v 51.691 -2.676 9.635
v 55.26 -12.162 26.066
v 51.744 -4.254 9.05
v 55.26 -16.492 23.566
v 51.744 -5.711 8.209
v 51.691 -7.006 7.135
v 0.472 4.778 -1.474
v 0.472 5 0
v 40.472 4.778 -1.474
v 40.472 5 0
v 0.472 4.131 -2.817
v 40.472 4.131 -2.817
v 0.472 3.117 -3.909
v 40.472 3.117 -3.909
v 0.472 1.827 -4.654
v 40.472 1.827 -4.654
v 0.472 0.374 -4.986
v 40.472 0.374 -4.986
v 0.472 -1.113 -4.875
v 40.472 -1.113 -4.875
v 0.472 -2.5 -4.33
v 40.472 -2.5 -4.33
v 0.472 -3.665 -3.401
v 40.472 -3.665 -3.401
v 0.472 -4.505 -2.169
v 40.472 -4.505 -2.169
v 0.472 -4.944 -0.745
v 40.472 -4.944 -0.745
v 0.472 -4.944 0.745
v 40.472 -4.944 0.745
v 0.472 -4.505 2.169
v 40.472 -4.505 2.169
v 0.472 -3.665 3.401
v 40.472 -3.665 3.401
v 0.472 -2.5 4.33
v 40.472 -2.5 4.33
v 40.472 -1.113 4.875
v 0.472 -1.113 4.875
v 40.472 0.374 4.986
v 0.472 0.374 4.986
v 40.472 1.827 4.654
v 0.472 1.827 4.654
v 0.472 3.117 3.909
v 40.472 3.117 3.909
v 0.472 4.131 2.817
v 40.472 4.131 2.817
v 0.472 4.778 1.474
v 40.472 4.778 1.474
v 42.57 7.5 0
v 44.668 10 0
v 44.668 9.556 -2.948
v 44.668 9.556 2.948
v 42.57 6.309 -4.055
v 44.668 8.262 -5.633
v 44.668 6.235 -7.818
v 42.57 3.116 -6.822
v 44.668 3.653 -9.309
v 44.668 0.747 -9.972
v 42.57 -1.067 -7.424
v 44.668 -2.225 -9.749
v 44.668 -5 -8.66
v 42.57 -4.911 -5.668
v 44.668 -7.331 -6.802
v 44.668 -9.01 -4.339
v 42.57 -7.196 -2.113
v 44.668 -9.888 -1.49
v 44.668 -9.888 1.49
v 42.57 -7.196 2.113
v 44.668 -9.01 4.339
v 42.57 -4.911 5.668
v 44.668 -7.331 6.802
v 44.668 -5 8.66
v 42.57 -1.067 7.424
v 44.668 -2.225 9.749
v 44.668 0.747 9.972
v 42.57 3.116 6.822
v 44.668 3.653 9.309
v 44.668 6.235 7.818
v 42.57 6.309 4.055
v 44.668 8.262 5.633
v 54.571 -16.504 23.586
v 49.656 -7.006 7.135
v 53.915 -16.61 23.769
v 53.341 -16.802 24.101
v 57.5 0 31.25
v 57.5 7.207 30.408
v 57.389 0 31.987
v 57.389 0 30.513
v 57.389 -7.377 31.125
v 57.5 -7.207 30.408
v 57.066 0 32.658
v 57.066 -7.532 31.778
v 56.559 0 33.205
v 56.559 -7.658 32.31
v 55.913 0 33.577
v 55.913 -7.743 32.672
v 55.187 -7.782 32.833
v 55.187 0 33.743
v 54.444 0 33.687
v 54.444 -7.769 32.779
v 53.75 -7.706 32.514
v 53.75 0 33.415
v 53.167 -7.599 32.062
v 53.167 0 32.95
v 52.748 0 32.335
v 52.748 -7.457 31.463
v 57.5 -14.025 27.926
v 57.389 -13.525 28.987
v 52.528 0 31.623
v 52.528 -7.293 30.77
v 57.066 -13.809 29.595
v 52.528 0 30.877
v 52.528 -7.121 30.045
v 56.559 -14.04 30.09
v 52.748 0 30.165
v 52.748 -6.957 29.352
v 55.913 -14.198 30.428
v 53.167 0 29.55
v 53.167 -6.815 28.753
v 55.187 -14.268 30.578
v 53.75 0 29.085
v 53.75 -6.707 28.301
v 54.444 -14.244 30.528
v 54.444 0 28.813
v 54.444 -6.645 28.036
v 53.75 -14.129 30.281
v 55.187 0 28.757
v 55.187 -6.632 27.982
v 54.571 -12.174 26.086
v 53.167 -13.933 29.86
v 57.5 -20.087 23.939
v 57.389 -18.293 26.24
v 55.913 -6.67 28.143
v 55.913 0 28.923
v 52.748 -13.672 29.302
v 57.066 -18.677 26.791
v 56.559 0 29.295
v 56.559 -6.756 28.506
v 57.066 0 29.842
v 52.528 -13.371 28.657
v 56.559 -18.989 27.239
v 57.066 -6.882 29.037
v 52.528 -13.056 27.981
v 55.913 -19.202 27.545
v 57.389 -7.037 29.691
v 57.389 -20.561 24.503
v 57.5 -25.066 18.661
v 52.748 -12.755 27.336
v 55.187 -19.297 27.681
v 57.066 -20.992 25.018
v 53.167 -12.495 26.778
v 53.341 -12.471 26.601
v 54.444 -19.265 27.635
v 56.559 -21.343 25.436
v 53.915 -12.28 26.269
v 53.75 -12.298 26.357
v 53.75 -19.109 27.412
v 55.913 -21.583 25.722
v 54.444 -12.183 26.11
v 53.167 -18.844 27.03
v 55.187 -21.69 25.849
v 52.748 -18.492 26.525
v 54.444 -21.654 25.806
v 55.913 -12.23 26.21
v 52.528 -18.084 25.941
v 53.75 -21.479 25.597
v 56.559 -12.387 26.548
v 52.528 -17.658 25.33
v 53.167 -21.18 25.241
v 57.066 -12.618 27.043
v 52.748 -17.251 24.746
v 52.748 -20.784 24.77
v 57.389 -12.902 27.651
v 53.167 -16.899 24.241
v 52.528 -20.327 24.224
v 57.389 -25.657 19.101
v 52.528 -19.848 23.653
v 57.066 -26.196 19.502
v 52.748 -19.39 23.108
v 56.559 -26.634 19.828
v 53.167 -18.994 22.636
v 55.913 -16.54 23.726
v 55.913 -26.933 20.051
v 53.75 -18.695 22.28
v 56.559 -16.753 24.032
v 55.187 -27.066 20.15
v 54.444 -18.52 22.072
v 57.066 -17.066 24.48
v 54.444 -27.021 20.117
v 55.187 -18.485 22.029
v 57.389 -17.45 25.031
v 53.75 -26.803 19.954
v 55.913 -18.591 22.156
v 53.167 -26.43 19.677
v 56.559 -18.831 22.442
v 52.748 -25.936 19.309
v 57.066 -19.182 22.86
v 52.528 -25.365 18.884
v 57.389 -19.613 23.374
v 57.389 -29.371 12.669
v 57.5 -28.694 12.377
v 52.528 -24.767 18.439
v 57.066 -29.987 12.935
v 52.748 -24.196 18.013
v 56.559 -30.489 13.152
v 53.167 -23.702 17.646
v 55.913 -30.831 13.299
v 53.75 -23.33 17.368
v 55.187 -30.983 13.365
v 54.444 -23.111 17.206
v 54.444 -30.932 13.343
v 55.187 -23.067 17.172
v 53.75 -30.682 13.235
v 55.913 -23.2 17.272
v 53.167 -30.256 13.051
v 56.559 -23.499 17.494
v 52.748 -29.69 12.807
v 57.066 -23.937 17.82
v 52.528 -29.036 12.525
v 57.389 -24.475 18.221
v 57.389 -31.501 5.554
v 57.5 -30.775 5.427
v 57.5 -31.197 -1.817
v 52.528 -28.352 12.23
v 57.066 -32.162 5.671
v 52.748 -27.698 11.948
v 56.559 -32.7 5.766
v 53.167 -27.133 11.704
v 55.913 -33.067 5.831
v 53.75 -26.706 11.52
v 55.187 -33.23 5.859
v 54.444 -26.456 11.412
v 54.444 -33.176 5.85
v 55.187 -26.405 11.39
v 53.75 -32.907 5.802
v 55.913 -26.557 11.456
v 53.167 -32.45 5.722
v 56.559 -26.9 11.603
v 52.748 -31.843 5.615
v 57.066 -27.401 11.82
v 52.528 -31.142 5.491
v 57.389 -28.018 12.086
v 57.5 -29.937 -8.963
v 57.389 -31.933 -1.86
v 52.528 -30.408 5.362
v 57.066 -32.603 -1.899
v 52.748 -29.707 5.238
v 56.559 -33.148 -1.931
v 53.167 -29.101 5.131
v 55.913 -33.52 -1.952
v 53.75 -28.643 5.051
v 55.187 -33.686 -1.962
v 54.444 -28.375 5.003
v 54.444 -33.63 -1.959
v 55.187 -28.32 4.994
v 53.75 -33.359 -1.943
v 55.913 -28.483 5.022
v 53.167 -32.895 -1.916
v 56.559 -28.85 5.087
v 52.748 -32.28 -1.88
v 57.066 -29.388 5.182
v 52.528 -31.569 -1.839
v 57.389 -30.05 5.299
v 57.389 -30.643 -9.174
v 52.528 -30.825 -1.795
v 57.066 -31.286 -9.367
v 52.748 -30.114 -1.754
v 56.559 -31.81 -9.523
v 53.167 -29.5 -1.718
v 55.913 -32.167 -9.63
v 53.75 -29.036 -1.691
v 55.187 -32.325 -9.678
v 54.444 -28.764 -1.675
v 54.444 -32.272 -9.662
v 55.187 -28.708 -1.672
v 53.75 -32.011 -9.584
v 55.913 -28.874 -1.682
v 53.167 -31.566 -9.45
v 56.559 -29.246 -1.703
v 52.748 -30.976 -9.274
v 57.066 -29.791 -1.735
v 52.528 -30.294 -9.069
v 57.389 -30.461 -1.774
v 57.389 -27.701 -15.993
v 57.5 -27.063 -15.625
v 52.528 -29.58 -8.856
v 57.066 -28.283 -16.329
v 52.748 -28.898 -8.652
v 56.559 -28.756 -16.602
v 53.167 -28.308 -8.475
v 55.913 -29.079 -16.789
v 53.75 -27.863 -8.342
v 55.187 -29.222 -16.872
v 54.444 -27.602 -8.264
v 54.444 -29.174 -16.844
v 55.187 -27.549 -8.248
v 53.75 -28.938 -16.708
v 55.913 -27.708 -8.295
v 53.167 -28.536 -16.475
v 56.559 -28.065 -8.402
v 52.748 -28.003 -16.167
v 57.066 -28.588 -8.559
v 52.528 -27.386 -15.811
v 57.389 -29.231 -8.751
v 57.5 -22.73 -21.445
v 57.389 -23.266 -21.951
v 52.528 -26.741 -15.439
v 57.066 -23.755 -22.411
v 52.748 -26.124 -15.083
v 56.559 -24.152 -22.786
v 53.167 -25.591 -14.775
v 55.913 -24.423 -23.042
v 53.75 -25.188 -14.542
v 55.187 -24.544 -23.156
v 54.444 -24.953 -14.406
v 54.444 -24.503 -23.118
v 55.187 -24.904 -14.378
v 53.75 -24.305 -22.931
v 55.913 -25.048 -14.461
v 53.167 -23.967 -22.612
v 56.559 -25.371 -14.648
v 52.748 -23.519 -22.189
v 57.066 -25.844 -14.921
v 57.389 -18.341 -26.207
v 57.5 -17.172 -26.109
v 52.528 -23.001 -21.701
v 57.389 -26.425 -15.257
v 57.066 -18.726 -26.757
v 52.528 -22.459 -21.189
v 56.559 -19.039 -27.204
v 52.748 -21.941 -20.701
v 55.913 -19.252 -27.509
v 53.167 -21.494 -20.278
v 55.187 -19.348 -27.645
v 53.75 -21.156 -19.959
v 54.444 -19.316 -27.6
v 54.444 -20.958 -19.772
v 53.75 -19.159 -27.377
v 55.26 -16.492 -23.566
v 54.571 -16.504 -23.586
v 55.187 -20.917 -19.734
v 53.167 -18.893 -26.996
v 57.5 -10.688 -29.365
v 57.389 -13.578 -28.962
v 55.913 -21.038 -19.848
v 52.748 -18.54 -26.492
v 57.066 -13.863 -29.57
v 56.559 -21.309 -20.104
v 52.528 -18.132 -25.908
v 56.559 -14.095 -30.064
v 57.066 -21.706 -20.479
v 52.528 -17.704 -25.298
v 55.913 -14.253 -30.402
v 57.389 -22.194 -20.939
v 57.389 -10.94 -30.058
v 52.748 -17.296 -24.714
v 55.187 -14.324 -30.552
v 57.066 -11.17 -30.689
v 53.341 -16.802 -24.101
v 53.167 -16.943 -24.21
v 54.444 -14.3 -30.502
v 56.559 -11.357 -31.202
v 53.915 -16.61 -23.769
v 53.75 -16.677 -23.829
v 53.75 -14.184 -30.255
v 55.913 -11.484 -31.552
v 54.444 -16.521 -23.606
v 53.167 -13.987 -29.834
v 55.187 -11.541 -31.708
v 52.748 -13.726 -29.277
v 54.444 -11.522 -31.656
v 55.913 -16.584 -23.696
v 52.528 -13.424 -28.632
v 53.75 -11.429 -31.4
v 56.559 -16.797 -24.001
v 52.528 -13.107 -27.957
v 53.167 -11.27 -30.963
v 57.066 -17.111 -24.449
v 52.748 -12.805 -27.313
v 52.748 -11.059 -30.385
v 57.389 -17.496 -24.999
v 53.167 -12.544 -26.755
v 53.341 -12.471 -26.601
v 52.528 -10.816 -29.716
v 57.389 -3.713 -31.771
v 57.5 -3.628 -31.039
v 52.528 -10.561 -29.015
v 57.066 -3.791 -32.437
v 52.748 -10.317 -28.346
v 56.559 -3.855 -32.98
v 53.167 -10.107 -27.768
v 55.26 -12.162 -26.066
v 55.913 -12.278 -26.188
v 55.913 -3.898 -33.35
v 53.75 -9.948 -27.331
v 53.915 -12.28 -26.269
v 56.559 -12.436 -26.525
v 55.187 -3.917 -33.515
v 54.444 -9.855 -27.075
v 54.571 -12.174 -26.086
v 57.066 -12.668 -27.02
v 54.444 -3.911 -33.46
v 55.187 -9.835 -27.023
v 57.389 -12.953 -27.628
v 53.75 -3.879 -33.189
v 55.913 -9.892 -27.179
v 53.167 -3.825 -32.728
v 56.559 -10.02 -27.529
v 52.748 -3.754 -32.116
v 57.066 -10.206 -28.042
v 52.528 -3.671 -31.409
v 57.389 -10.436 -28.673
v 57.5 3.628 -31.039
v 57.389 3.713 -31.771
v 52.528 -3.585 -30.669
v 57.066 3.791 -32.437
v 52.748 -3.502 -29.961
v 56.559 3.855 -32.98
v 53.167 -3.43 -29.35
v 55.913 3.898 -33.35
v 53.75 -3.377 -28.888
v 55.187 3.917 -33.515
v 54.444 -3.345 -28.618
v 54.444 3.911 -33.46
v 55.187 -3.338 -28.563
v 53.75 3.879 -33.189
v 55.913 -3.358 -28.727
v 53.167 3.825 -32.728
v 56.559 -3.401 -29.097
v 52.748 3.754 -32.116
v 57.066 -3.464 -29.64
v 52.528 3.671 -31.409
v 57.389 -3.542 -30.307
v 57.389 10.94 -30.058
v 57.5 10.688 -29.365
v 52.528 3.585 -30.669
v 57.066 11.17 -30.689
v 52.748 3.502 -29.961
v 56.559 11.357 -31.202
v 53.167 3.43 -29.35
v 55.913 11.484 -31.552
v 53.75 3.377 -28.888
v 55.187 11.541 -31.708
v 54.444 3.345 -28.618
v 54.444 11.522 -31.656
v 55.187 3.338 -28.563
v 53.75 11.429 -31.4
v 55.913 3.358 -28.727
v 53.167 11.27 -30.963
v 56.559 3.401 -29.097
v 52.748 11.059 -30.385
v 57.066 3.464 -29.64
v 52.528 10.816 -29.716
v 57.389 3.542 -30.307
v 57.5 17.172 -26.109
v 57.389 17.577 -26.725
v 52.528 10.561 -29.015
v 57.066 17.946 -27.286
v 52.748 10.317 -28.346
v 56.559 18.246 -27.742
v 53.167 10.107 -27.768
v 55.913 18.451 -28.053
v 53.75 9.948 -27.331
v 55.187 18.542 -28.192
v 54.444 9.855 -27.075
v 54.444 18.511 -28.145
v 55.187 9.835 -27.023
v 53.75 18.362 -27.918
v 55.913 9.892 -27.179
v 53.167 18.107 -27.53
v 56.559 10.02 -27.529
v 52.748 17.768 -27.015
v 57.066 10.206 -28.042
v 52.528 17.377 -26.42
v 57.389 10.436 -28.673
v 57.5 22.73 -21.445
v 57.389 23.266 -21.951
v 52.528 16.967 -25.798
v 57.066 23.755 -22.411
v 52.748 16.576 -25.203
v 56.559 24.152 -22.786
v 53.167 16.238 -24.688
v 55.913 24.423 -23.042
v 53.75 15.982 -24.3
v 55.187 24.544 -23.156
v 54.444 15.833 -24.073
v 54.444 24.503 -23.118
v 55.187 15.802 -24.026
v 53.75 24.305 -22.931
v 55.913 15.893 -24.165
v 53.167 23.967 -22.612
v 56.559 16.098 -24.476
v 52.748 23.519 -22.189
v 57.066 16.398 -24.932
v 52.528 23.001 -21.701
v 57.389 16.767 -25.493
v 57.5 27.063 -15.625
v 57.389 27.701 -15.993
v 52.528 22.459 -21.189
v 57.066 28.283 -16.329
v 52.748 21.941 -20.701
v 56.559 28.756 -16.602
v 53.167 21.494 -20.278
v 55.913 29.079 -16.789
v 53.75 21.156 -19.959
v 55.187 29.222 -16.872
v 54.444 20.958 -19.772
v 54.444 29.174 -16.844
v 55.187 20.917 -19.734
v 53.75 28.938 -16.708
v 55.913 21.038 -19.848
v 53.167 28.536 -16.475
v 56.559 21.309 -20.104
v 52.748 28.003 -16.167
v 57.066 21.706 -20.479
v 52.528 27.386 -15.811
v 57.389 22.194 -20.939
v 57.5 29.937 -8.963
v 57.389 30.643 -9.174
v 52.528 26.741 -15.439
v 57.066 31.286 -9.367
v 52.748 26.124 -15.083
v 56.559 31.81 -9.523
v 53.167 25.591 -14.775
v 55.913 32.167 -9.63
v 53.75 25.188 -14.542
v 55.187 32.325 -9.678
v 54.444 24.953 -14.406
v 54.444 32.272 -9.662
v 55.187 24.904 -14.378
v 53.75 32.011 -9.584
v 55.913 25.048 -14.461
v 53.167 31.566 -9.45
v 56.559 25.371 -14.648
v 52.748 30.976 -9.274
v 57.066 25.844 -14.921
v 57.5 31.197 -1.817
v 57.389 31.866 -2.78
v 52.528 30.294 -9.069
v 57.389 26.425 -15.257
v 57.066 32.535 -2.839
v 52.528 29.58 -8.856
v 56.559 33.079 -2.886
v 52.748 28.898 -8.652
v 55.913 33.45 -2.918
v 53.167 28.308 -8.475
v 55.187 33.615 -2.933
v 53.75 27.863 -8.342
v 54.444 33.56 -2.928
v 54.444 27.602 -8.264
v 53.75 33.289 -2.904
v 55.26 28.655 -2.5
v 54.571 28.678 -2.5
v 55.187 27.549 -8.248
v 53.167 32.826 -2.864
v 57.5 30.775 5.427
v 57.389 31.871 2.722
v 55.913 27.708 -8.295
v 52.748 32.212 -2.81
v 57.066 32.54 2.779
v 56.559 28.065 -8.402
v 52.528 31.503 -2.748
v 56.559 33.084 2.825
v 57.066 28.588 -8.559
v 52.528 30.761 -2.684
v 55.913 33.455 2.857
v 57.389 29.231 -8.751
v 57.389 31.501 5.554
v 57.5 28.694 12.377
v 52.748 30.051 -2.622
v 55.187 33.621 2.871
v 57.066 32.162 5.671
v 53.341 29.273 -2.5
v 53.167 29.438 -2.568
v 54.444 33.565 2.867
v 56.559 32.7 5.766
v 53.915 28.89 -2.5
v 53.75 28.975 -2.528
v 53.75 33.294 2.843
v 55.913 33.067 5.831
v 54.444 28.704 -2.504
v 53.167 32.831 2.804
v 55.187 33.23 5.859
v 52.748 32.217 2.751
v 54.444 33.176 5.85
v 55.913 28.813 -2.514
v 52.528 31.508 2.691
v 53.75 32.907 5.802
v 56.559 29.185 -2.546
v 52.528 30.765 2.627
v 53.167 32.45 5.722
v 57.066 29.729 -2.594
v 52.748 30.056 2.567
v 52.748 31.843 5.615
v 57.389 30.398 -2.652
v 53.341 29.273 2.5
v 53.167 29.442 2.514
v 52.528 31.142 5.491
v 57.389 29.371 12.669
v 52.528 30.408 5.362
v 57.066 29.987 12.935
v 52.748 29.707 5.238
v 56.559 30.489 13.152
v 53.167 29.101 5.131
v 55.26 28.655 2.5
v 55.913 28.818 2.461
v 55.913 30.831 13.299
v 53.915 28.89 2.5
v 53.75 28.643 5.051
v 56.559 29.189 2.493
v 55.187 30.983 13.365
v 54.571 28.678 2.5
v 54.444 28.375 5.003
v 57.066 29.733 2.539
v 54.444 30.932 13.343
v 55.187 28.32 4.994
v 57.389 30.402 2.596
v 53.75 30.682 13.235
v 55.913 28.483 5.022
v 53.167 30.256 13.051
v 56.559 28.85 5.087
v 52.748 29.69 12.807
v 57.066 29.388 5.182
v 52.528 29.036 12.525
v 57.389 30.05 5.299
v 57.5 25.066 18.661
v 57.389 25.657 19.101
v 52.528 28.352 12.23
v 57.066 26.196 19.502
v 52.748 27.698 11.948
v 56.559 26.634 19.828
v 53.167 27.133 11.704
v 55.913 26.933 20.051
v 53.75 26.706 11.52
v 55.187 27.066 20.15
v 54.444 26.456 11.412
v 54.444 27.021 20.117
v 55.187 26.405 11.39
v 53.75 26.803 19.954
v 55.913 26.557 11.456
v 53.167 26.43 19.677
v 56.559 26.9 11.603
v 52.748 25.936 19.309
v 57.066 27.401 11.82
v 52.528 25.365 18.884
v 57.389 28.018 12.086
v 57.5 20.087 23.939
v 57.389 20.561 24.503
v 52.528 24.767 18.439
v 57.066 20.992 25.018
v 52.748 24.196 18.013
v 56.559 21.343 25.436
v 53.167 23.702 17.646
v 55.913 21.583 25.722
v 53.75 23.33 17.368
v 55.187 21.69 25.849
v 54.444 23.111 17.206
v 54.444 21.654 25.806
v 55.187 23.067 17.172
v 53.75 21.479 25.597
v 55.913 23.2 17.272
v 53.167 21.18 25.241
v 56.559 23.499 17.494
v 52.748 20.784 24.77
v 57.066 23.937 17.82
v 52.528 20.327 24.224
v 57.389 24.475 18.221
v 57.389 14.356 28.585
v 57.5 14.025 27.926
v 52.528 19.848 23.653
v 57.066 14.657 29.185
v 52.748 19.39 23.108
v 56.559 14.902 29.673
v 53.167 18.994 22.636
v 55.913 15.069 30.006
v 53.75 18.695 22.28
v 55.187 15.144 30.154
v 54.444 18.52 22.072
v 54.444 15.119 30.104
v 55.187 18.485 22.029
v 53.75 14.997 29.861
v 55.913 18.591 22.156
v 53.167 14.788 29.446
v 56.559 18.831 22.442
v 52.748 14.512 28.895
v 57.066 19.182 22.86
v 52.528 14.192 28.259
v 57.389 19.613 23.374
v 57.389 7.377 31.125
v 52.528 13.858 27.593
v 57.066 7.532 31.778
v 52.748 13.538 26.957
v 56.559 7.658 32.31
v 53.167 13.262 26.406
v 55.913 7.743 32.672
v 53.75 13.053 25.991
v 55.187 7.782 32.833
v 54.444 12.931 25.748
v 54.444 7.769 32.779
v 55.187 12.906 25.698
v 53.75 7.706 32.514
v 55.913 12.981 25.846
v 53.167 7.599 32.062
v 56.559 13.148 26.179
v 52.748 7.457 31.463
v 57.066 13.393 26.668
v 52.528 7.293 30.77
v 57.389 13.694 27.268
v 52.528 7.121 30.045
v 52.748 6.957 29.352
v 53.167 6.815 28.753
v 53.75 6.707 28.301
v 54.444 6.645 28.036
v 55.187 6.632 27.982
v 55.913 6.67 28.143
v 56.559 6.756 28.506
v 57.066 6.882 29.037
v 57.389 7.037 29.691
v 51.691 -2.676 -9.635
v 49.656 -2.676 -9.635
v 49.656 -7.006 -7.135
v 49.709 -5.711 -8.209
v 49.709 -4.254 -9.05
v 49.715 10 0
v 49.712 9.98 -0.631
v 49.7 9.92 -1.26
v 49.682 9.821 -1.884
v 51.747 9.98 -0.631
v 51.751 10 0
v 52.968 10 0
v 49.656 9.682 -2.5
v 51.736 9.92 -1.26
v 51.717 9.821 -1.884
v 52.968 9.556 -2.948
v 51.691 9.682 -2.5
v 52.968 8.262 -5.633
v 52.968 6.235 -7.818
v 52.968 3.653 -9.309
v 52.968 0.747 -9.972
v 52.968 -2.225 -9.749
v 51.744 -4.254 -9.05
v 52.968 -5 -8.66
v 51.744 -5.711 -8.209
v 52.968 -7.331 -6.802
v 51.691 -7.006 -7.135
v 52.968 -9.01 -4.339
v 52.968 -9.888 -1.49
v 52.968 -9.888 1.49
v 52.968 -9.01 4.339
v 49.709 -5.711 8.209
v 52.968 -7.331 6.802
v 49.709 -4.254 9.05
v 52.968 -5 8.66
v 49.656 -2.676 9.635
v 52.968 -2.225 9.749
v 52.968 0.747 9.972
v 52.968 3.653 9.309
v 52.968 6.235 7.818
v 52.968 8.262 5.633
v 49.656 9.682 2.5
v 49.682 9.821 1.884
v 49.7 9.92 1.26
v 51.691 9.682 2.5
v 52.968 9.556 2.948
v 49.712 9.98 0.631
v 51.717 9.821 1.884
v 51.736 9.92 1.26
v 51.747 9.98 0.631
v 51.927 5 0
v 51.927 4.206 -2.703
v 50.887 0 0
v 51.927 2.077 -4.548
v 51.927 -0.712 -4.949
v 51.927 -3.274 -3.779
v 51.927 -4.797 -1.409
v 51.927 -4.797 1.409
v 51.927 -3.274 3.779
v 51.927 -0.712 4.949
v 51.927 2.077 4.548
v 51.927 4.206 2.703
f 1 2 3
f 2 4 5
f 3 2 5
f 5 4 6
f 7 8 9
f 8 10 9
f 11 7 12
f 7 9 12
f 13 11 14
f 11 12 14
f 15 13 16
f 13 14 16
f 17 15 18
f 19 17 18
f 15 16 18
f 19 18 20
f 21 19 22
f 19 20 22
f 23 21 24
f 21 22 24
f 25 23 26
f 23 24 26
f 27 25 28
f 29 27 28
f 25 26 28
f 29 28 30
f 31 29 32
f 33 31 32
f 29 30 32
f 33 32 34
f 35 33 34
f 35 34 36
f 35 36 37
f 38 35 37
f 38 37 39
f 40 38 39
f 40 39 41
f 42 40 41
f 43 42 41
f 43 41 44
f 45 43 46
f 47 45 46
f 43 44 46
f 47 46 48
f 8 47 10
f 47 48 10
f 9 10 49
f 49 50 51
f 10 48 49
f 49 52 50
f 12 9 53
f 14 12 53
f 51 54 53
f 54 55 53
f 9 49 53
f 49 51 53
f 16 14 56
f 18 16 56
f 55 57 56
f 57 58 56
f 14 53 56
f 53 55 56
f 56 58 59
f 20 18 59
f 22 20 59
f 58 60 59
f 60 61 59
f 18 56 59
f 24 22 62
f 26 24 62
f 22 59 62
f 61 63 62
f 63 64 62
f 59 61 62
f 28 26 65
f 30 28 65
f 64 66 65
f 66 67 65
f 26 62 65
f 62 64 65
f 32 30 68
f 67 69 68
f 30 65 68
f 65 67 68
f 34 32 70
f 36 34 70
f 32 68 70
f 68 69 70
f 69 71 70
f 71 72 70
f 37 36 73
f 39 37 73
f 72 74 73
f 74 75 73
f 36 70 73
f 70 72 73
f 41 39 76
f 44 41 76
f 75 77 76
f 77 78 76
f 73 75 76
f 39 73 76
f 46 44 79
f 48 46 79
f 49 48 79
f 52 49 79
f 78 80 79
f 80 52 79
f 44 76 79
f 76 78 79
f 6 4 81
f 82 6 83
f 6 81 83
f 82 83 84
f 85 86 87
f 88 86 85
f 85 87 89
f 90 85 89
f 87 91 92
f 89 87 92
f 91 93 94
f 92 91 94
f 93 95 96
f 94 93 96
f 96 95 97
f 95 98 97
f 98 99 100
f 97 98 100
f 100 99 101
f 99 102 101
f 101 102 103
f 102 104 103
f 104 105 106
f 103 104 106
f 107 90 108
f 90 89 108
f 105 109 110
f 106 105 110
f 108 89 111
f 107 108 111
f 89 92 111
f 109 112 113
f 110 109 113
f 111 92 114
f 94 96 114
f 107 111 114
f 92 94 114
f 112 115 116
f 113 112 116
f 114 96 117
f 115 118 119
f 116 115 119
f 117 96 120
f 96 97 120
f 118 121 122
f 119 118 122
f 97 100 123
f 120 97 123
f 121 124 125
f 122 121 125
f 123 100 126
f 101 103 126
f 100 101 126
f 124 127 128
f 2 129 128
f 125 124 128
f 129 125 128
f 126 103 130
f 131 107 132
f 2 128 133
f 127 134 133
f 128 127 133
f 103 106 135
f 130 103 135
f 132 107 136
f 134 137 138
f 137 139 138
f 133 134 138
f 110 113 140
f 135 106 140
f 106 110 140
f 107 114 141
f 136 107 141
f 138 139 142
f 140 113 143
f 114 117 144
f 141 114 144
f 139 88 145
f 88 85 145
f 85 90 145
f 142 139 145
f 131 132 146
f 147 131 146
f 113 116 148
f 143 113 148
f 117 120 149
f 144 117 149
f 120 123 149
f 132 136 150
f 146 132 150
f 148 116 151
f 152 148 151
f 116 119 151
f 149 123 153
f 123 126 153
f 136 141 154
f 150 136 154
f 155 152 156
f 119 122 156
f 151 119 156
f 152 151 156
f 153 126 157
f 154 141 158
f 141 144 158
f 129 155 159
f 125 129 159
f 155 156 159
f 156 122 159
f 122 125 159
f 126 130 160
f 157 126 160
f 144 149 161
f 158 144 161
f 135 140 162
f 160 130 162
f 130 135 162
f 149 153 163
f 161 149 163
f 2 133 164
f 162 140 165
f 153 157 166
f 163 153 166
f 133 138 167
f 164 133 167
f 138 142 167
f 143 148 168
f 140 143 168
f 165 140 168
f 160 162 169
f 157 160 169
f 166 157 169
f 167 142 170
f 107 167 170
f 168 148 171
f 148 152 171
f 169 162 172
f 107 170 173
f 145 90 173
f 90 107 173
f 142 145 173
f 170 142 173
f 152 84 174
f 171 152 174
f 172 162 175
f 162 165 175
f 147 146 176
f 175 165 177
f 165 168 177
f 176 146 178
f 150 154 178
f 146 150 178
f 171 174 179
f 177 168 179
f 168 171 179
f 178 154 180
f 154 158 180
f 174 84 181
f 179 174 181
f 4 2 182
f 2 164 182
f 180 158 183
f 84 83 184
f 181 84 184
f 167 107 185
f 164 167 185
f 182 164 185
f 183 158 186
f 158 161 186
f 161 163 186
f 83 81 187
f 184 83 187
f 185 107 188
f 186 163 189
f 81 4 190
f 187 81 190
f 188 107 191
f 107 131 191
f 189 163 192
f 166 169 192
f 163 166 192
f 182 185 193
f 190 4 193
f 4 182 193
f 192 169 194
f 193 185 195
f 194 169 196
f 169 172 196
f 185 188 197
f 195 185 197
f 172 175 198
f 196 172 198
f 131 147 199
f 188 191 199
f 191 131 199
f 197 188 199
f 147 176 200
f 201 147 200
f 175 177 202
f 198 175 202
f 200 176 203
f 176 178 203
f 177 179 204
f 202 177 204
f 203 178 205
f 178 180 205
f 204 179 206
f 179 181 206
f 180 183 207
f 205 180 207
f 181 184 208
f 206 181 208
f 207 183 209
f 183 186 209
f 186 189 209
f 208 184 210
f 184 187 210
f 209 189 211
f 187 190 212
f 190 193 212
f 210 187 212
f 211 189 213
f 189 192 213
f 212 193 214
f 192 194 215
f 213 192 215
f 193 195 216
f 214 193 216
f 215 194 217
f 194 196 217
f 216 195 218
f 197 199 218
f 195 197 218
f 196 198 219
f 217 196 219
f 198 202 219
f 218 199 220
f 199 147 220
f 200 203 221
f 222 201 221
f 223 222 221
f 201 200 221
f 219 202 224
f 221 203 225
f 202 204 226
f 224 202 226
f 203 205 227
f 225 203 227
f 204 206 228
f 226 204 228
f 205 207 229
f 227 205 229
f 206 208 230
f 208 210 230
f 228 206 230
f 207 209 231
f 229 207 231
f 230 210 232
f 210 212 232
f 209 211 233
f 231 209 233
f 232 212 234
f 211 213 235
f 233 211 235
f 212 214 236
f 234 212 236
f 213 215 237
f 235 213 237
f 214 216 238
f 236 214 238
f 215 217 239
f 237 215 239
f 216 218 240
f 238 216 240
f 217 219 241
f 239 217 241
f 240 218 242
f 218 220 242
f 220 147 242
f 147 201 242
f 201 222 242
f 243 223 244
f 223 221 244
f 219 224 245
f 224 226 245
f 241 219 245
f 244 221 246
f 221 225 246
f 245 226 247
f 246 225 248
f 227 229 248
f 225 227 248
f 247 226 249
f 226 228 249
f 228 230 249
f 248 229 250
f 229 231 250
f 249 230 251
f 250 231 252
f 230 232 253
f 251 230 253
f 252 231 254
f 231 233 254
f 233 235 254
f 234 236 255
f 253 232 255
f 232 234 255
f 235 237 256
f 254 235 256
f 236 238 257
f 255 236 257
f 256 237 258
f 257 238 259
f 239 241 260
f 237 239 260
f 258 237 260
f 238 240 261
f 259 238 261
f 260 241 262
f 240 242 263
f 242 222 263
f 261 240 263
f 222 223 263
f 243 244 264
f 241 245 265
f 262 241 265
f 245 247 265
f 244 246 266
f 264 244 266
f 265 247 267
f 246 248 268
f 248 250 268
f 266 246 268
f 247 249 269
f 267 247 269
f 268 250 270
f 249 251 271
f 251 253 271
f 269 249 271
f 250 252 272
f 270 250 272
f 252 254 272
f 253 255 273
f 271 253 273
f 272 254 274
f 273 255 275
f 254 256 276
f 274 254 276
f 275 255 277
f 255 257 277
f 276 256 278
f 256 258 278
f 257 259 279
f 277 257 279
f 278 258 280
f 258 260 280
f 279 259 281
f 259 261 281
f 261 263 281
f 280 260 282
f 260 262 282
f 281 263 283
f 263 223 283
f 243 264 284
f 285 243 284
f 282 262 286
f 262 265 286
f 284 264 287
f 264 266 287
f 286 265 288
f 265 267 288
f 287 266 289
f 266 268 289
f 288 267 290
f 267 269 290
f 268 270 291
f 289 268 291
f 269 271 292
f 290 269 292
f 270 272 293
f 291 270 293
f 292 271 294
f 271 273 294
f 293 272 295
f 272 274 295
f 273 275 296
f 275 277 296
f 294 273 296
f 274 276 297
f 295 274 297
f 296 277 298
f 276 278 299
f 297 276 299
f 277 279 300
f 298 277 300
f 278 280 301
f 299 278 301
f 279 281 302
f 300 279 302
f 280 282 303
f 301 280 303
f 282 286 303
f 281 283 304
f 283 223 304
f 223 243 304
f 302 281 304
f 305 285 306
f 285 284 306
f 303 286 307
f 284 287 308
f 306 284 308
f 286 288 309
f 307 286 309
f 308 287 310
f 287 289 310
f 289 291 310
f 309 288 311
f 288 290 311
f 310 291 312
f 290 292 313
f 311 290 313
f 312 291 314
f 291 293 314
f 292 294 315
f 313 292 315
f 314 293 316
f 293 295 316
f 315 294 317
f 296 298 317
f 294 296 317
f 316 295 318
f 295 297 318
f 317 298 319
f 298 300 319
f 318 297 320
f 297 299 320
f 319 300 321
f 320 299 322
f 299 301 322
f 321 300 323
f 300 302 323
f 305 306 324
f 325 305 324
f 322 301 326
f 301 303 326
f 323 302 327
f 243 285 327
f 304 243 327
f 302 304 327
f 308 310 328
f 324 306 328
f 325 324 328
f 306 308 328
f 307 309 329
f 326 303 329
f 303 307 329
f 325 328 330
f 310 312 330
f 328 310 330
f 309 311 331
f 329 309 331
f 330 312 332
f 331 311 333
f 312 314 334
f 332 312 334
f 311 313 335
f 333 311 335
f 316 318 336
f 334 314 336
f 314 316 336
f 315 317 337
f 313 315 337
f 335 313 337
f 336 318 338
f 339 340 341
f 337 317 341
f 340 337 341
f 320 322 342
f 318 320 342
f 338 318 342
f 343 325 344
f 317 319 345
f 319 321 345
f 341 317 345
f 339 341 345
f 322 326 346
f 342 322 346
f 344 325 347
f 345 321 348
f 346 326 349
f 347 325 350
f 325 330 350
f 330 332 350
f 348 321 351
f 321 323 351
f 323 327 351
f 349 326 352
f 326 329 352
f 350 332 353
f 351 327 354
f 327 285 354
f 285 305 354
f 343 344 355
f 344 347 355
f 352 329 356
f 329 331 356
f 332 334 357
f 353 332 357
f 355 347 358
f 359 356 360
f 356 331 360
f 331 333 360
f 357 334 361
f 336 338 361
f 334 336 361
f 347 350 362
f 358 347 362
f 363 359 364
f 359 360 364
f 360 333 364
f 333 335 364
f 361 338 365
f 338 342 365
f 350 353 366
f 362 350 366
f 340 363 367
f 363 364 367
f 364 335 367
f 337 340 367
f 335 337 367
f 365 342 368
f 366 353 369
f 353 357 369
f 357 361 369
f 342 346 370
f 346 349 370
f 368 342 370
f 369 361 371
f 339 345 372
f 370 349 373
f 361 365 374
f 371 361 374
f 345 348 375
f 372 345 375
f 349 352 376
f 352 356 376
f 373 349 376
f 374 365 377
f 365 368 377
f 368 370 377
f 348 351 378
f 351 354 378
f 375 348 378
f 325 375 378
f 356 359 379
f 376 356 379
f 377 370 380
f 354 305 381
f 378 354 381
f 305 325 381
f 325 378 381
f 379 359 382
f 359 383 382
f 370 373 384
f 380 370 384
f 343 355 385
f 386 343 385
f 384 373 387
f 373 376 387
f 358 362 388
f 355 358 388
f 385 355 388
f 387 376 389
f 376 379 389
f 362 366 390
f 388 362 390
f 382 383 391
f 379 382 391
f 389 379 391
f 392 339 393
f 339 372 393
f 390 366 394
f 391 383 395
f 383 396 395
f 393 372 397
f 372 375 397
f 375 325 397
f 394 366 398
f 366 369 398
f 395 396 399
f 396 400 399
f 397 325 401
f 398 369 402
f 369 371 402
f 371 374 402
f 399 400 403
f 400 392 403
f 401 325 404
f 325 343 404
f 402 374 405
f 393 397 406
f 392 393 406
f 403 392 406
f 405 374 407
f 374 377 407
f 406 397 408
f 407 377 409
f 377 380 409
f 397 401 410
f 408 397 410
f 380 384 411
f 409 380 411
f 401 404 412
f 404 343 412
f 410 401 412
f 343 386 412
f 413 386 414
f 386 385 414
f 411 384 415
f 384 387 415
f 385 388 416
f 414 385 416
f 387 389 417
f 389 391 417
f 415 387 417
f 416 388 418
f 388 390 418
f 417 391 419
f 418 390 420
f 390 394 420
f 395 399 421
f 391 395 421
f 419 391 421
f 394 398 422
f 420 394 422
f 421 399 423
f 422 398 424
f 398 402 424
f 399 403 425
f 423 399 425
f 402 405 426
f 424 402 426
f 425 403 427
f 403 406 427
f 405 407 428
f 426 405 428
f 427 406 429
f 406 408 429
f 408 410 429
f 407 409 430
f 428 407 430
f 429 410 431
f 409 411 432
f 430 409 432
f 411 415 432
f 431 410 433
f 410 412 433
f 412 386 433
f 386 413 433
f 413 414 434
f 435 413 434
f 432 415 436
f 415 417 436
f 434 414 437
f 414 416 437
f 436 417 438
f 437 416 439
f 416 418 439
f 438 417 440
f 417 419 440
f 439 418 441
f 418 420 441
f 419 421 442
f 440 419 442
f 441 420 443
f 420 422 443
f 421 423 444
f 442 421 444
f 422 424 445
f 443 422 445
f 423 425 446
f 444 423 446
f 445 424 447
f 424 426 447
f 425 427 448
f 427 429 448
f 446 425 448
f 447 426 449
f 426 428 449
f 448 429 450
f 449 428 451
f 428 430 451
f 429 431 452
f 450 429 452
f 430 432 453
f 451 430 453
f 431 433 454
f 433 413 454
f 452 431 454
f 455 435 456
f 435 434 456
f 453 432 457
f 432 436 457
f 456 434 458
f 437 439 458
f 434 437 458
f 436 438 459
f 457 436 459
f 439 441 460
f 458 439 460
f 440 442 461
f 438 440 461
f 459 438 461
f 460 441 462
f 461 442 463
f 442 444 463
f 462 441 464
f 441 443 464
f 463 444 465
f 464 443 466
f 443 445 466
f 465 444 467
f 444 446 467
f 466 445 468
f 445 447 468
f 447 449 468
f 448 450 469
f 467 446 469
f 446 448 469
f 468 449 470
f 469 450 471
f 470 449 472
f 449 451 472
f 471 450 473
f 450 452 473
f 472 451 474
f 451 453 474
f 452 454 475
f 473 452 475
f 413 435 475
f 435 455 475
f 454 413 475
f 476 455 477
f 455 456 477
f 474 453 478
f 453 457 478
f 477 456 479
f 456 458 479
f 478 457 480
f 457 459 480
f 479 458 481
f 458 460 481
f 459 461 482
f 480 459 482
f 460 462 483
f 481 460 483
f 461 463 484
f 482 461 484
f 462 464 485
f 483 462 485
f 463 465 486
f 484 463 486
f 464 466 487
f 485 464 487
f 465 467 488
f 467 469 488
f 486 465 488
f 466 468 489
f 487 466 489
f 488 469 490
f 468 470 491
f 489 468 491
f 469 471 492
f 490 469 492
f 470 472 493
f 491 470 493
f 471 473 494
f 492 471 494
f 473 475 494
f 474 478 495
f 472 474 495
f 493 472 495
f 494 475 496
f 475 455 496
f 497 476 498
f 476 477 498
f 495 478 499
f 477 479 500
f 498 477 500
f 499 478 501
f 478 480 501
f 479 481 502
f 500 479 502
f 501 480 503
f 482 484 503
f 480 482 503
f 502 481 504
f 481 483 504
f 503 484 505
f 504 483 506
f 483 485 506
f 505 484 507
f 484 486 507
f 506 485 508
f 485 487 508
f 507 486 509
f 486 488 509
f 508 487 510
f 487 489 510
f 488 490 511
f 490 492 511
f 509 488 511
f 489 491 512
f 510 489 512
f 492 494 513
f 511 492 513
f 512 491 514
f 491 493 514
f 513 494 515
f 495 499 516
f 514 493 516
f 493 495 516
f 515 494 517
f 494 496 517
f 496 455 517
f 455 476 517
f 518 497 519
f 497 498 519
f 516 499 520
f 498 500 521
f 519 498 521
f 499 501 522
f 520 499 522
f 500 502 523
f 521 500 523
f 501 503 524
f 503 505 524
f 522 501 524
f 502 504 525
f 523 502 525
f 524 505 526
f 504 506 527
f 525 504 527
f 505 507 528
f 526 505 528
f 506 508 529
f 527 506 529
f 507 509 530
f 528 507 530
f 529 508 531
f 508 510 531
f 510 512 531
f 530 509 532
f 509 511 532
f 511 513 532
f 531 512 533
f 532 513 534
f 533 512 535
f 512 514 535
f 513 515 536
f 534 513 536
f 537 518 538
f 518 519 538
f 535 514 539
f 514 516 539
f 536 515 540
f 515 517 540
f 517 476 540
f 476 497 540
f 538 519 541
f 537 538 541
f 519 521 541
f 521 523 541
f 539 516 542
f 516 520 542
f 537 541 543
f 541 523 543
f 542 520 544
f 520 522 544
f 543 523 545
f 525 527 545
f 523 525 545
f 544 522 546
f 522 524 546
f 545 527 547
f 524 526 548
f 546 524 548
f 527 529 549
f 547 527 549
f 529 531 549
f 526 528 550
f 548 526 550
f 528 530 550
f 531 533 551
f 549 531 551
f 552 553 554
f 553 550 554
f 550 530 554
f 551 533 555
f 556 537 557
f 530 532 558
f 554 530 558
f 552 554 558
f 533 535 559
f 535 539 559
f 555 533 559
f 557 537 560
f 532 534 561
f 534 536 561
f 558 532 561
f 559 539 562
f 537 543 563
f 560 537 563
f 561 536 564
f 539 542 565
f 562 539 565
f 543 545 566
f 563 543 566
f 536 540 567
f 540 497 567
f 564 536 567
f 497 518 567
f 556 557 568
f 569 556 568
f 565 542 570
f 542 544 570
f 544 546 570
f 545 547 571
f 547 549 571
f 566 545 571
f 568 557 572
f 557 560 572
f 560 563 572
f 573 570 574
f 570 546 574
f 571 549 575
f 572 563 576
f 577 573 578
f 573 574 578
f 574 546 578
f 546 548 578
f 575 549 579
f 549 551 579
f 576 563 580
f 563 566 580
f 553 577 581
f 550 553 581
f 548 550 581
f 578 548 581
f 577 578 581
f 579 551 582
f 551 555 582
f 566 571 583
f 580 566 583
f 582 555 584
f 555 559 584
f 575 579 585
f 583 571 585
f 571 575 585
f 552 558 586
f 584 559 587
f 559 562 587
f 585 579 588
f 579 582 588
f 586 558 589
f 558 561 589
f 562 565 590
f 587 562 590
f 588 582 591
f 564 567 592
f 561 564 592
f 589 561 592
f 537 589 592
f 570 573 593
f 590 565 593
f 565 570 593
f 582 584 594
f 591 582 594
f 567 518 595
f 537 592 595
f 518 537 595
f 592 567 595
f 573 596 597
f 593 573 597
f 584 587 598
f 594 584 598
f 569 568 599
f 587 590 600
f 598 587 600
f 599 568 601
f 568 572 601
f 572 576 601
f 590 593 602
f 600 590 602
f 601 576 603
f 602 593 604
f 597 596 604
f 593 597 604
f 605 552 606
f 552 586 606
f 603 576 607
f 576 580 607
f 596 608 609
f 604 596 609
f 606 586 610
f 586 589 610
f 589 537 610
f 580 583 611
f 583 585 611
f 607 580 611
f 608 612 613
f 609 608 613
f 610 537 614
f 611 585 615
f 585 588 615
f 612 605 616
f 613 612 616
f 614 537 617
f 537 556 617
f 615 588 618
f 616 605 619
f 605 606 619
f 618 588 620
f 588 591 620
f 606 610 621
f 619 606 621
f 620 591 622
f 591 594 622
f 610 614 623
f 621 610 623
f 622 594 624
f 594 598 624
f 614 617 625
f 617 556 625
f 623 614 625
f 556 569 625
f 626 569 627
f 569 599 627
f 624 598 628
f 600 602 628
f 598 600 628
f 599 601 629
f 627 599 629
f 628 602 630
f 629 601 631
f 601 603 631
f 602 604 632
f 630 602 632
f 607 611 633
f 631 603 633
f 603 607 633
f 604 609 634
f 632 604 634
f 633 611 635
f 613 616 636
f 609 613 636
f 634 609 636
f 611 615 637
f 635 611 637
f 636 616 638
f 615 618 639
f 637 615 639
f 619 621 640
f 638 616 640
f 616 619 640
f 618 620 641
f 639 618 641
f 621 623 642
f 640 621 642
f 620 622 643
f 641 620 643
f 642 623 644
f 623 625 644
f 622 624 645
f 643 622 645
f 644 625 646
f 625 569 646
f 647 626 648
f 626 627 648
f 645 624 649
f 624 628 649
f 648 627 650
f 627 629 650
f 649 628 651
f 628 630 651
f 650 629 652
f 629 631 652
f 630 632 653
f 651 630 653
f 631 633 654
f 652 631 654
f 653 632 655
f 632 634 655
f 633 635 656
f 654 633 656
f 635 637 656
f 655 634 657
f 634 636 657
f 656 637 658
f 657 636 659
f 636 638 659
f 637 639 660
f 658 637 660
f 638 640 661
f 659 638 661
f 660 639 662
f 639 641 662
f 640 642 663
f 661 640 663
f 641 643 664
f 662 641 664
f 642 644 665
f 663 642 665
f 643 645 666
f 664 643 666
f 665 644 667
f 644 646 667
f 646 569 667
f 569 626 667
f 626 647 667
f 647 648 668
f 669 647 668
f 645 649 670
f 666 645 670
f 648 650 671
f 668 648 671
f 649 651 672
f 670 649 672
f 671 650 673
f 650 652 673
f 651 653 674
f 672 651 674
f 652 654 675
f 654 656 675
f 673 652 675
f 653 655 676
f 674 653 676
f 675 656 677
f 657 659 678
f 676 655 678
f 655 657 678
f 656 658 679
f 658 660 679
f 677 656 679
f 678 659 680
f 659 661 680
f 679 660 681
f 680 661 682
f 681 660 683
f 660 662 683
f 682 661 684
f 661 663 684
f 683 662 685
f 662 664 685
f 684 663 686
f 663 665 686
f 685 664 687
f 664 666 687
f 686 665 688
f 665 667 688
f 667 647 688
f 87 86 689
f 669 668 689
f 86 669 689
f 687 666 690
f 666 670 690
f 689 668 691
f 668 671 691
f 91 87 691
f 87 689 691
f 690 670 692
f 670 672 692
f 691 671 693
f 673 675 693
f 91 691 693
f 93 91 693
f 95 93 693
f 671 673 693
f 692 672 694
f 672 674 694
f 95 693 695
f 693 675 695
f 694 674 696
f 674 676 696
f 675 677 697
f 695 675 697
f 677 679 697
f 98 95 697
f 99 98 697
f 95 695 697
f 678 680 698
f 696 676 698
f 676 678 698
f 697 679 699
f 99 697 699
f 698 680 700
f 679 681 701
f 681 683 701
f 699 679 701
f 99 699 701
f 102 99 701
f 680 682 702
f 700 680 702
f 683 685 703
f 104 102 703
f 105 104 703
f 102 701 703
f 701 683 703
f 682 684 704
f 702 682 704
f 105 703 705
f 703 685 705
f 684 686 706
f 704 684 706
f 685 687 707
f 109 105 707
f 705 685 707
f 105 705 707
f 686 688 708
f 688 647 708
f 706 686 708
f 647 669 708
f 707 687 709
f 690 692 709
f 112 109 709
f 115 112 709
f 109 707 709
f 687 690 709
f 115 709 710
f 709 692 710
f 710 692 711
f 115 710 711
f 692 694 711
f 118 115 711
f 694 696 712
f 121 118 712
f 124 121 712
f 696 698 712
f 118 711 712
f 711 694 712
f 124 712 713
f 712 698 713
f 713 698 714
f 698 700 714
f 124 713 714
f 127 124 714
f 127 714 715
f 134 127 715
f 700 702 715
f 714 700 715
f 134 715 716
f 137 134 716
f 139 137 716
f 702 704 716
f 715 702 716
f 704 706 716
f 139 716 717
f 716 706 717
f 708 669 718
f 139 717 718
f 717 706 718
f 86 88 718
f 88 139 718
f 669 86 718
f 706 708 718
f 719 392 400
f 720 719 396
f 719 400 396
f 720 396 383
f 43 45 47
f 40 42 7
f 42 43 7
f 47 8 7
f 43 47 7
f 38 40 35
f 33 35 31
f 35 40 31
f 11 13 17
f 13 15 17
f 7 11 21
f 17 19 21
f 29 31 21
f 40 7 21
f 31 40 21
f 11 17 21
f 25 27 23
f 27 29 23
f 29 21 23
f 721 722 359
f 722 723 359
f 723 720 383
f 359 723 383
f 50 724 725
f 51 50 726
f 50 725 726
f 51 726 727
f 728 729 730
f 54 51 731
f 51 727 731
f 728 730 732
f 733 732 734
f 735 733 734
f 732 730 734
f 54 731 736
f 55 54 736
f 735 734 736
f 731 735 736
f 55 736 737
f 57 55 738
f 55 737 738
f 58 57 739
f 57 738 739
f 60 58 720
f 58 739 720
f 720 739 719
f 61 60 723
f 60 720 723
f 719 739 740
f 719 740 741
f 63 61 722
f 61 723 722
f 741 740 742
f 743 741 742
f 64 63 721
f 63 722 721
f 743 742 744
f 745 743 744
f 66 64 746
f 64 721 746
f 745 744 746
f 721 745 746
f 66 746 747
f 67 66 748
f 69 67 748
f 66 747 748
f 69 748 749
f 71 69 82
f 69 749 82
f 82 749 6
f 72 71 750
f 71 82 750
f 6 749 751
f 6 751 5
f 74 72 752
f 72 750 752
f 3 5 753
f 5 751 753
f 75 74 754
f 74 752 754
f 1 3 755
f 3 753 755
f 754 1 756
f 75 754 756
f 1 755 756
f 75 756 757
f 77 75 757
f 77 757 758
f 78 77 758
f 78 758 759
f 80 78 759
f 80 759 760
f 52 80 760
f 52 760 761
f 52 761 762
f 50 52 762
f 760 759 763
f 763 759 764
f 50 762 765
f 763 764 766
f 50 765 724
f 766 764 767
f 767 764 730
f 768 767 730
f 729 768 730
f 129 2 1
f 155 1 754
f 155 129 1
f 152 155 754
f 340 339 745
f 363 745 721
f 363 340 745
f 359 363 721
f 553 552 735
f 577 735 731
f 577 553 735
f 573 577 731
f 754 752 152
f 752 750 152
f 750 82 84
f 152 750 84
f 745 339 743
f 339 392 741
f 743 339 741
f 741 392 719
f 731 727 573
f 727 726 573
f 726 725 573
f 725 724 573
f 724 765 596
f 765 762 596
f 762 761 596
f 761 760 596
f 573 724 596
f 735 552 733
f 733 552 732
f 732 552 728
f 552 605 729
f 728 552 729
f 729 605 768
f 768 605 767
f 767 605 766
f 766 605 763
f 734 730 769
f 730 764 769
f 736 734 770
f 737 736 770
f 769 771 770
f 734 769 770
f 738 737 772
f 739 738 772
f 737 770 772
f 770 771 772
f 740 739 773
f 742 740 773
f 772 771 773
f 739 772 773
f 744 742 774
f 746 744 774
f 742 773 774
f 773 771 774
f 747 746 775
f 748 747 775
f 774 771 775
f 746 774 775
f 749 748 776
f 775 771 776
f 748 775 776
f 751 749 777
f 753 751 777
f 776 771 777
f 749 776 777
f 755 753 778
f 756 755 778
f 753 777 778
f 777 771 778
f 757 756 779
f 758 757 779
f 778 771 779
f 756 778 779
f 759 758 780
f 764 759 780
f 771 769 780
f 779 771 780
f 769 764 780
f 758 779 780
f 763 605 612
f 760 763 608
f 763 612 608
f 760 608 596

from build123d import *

# Parameters (mm, degrees)
IZIM2_R                     = 2.5
Y_KSEKLIK_EKSTR_ZYON1_DEPTH = 2.5
DAIRESEL_KAPLAMA1_COUNT     = 3


with BuildPart() as part:
    # Çizim1 → Döndür2 (revolve)
    with BuildSketch(Plane.XY):
        Polygon((0.472431585, 0), (0.472431585, 5), (40.472431585, 5), (44.667929741, 10), (52.967929741, 10), (50.88702434, 0), align=None)
    revolve(axis=Axis((0.472431585, 0, 0), (-1, 0, 0)))



with BuildPart() as body_2:
    # Çizim2 → Döndür3 (revolve)
    with BuildSketch(Plane.XY, mode=Mode.PRIVATE) as d_nd_r3_sk:
        with Locations((55, 31.25)):
            Circle(IZIM2_R)
    revolve(d_nd_r3_sk.sketch.rotate(Axis((0, 0, 0), (1, 0, 0)), 90), axis=Axis((0, 0, 0), (1, 0, 0)))


with BuildPart() as part_1:
    add(part.part)

    add(body_2.part)  # Yükseklik-Ekstrüzyon1 merges body 2
    # Çizim3 → Yükseklik-Ekstrüzyon1 (add, symmetric)
    with BuildSketch(Plane.XY):
        Polygon((51.6, 9.2), (49.564913151, 9.2), (53.984913151, 32.693820177), (56.02, 32.693820177), align=None)
    y_kseklik_ekstr_zyon1 = extrude(amount=Y_KSEKLIK_EKSTR_ZYON1_DEPTH, both=True)

    # Dairesel Kaplama1: Yükseklik-Ekstrüzyon1 ×3 about axis
    dairesel_kaplama1_axis = Axis((0, 0, 0), (1, 0, 0))
    for i in range(1, DAIRESEL_KAPLAMA1_COUNT):
        add(y_kseklik_ekstr_zyon1.rotate(dairesel_kaplama1_axis, i * 360 / DAIRESEL_KAPLAMA1_COUNT))


solid = part_1.part
